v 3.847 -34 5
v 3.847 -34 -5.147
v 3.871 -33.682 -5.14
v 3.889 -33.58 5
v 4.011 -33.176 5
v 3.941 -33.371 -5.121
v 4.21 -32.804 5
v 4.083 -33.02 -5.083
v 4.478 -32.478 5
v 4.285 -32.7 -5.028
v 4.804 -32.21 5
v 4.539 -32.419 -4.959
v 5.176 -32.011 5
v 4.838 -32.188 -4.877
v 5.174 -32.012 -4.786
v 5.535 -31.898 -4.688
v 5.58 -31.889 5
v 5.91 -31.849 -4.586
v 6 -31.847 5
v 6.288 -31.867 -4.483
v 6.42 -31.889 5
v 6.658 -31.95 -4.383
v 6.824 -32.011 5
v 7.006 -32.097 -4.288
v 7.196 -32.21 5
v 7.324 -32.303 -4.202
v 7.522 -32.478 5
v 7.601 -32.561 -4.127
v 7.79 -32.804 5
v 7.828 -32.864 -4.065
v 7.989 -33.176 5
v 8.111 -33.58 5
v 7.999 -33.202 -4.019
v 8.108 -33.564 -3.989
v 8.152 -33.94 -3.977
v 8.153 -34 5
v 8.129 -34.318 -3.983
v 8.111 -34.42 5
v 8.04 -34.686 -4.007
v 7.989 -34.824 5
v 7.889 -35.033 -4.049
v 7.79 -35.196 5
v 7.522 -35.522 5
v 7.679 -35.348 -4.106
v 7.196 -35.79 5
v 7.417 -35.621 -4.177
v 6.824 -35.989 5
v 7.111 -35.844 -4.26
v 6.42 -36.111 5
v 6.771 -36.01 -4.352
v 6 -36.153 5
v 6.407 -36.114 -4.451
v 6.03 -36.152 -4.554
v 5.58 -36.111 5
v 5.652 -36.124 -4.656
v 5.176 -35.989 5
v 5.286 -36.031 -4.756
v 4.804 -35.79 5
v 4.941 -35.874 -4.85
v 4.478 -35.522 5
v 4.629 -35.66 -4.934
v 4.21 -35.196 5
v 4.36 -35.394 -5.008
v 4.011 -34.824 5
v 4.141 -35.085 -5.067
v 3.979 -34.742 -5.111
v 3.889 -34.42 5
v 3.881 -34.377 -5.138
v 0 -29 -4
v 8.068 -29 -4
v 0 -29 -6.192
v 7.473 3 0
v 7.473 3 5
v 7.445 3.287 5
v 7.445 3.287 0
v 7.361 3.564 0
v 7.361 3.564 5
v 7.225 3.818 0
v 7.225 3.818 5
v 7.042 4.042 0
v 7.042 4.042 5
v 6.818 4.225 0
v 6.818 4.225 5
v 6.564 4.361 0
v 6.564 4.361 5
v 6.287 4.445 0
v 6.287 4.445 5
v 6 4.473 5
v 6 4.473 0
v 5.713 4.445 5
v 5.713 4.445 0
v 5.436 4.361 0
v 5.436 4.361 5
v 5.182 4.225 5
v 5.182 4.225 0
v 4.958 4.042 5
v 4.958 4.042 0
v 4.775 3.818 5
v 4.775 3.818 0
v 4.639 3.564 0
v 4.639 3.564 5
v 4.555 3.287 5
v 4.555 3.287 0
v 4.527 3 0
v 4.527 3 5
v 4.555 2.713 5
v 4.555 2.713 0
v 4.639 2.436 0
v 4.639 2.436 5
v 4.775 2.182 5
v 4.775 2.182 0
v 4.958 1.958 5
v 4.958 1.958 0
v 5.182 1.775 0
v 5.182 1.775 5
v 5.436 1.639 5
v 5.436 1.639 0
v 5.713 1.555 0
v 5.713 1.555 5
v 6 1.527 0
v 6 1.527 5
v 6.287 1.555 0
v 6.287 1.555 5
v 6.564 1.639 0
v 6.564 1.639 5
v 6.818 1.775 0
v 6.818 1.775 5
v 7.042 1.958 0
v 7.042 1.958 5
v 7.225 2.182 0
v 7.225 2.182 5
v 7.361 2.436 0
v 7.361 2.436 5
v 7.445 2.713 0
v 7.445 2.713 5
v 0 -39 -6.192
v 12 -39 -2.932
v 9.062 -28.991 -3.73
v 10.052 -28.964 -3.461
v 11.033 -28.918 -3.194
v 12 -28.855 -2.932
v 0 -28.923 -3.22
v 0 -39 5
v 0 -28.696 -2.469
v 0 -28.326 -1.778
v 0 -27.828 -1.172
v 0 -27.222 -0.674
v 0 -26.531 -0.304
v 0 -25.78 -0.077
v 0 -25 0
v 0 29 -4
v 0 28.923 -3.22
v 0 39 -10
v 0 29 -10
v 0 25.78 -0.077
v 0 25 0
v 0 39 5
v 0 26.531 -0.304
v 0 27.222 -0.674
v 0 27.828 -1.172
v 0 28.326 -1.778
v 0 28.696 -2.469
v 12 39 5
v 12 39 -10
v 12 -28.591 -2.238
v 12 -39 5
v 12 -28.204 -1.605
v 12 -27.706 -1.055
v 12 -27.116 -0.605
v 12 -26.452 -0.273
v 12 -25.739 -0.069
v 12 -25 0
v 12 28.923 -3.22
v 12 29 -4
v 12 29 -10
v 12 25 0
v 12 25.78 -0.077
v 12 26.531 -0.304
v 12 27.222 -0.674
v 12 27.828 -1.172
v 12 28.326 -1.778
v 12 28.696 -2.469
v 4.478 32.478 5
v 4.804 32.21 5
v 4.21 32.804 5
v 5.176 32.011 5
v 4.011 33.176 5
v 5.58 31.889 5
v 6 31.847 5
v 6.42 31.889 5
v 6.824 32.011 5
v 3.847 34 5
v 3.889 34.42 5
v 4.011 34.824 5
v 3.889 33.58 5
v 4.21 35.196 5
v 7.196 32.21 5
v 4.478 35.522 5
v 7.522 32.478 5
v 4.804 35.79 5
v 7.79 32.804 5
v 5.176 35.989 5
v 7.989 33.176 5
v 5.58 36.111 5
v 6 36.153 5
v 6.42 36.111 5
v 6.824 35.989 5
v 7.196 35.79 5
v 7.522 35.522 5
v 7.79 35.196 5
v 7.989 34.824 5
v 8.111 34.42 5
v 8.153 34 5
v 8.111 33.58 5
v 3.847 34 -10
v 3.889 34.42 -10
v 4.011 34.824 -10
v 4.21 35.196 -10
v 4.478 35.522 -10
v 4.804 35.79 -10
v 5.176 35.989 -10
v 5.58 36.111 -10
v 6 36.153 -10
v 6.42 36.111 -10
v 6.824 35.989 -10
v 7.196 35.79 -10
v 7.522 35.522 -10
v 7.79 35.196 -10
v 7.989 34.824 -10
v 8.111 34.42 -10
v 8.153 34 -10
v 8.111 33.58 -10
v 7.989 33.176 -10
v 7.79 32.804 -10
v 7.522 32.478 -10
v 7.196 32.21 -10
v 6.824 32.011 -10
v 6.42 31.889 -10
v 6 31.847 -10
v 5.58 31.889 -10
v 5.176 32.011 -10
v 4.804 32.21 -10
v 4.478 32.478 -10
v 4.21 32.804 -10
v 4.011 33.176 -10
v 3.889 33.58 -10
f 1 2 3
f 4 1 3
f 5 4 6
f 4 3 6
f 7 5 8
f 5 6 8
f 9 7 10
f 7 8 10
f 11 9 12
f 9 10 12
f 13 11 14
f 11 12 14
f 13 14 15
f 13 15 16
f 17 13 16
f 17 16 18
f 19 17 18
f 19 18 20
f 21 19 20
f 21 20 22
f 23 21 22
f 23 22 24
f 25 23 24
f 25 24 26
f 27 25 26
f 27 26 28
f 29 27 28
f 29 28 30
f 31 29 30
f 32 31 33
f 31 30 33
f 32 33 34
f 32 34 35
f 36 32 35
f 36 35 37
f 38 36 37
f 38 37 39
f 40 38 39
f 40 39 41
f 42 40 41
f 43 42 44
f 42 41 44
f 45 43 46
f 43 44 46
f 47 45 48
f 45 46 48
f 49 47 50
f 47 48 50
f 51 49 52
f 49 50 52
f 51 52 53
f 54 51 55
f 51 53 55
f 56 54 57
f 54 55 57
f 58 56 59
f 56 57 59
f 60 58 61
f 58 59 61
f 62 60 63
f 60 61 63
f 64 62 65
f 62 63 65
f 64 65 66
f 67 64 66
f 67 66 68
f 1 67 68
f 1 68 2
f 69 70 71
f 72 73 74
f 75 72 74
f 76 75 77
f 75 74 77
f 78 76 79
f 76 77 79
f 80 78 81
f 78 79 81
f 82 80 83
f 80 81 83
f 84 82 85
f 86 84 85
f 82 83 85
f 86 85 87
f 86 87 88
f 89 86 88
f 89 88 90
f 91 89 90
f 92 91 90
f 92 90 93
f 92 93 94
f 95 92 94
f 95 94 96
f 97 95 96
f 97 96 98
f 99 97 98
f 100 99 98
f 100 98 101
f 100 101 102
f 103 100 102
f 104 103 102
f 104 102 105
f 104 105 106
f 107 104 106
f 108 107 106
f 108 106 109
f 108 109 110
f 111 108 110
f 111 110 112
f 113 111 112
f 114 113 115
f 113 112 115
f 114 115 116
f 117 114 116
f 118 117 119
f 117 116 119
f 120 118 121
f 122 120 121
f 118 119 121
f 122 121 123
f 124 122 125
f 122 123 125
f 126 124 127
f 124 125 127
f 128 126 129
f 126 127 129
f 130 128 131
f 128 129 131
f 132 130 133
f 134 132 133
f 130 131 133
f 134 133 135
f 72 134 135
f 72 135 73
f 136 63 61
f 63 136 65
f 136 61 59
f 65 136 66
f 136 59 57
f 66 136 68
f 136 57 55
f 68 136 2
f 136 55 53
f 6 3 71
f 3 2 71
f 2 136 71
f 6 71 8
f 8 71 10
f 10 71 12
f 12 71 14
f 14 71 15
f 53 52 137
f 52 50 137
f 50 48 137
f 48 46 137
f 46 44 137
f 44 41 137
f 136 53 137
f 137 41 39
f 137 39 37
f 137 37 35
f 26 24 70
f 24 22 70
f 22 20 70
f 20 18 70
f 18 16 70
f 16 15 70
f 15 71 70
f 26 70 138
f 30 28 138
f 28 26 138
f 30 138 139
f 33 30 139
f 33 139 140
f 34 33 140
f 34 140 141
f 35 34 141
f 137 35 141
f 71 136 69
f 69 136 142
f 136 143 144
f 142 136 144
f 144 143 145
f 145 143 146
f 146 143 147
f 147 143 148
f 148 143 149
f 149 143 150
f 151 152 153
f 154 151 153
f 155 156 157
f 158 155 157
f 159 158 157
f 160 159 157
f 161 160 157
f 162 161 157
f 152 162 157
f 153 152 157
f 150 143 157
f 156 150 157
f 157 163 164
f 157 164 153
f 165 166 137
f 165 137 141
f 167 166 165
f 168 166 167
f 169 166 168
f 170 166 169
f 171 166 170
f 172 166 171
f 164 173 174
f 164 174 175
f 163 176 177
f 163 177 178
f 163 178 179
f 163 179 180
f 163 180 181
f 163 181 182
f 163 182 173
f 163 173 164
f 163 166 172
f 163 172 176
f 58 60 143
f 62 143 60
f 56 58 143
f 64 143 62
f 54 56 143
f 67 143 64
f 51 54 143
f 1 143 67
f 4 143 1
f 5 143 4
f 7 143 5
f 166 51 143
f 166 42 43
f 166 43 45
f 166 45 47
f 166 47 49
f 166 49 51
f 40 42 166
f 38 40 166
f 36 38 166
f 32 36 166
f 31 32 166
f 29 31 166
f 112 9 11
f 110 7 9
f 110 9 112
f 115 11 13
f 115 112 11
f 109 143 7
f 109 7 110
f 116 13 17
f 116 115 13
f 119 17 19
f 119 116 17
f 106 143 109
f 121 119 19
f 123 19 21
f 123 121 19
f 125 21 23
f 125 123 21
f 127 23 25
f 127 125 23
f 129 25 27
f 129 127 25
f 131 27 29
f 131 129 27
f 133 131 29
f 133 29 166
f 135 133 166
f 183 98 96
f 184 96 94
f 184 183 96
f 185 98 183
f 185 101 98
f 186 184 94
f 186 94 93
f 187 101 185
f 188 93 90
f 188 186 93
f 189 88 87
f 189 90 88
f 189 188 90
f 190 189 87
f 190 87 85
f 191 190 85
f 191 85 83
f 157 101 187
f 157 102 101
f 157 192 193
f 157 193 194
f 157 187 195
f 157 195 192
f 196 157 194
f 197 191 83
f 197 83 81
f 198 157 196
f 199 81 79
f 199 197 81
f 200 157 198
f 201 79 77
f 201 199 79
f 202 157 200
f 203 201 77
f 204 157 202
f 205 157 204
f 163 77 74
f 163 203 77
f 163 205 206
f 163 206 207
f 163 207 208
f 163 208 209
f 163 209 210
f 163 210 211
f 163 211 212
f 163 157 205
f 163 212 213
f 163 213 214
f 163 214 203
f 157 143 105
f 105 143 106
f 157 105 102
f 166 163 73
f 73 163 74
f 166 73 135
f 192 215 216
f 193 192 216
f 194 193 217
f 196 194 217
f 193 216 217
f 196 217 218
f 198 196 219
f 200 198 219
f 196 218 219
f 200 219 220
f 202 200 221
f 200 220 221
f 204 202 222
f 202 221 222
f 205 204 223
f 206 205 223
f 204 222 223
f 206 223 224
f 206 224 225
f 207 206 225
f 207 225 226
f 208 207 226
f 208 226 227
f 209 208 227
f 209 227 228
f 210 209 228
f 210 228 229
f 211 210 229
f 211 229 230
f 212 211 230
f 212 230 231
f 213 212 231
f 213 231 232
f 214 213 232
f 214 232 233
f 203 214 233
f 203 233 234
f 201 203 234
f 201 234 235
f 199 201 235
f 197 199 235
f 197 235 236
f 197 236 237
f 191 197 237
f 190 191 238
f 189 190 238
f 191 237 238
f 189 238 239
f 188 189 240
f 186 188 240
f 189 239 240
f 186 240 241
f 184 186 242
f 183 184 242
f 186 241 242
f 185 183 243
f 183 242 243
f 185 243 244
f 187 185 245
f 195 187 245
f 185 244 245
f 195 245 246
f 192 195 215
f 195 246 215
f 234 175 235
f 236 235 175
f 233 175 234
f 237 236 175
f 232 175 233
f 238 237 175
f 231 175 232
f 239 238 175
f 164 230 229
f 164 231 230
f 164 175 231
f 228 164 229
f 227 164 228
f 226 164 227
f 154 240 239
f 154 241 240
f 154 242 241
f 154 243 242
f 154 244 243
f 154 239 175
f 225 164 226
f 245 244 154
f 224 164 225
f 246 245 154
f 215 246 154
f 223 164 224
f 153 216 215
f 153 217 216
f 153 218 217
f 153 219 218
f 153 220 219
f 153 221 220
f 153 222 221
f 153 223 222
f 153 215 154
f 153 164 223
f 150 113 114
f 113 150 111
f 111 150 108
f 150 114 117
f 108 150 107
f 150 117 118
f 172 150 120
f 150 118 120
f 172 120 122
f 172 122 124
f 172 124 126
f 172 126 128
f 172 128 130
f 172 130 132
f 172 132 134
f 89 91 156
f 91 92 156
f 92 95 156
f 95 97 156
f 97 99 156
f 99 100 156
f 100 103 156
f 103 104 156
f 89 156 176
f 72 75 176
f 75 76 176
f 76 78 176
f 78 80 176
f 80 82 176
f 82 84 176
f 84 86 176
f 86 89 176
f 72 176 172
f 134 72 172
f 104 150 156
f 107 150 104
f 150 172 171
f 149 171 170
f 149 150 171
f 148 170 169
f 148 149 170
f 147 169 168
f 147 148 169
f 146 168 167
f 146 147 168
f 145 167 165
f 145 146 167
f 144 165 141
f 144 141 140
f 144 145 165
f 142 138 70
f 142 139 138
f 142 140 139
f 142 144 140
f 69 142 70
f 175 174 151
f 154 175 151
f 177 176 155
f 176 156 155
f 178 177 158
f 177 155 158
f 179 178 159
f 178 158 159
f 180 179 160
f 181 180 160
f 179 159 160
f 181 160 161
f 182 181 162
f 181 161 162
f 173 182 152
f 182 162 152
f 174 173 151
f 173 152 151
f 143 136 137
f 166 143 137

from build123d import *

# Parameters (mm, degrees)
EXTRUDE1_DEPTH        = 5
SKETCH3_R             = 1.4732
CUT_EXTRUDE2_DEPTH    = 6
SKETCH4_W             = 12
SKETCH4_H             = 10
EXTRUDE2_DEPTH        = 10
FILLET1_R             = 4
CUT_EXTRUDE3_DEPTH    = 39
F_8_CLEARANCE_HOLE1_D = 4.3053


with BuildPart() as part:
    # Sketch1 → Extrude1 (new body)
    with BuildSketch(Plane.XY):
        Polygon((0, 39), (0, -39), (12, -39), (12, 0), (12, 39), align=None)
    extrude(amount=EXTRUDE1_DEPTH)

    # Sketch3 → Cut-Extrude2 (cut, through all)
    with BuildSketch(Plane.XY.offset(5)):
        with Locations((6, 3)):
            Circle(SKETCH3_R)
    extrude(amount=-CUT_EXTRUDE2_DEPTH, mode=Mode.SUBTRACT)

    # Sketch4 → Extrude2 (add)
    with BuildSketch(Plane(origin=(0, 0, 0), x_dir=(-1, 0, 0), z_dir=(0, 0, -1))):
        with Locations((-6, 34)):
            Rectangle(SKETCH4_W, SKETCH4_H)
        with Locations((-6, -34)):
            Rectangle(SKETCH4_W, SKETCH4_H)
    extrude(amount=EXTRUDE2_DEPTH)

    # Fillet1
    fillet1_edges = [part.edges().sort_by_distance(p)[0] for p in [
        (6, -29, 0),
        (6, 29, 0),
    ]]
    fillet(fillet1_edges, radius=FILLET1_R)

    # Sketch5 → Cut-Extrude3 (cut)
    with BuildSketch(Plane(origin=(0, 0, 0), x_dir=(1, 0, 0), z_dir=(0, 1, 0))):
        Polygon((0, 10), (0, 6.192), (12, 2.931672159), (12, 8.784609691), (12, 10), align=None)
    extrude(amount=-CUT_EXTRUDE3_DEPTH, mode=Mode.SUBTRACT)

    # #8 Clearance Hole1 (through all)
    with Locations(Plane(origin=(6, 34, 5), x_dir=(1, 0, 0), z_dir=(0, 0, 1))):
        with Locations((0, 0), (0, -68)):
            Hole(F_8_CLEARANCE_HOLE1_D / 2)


solid = part.part
